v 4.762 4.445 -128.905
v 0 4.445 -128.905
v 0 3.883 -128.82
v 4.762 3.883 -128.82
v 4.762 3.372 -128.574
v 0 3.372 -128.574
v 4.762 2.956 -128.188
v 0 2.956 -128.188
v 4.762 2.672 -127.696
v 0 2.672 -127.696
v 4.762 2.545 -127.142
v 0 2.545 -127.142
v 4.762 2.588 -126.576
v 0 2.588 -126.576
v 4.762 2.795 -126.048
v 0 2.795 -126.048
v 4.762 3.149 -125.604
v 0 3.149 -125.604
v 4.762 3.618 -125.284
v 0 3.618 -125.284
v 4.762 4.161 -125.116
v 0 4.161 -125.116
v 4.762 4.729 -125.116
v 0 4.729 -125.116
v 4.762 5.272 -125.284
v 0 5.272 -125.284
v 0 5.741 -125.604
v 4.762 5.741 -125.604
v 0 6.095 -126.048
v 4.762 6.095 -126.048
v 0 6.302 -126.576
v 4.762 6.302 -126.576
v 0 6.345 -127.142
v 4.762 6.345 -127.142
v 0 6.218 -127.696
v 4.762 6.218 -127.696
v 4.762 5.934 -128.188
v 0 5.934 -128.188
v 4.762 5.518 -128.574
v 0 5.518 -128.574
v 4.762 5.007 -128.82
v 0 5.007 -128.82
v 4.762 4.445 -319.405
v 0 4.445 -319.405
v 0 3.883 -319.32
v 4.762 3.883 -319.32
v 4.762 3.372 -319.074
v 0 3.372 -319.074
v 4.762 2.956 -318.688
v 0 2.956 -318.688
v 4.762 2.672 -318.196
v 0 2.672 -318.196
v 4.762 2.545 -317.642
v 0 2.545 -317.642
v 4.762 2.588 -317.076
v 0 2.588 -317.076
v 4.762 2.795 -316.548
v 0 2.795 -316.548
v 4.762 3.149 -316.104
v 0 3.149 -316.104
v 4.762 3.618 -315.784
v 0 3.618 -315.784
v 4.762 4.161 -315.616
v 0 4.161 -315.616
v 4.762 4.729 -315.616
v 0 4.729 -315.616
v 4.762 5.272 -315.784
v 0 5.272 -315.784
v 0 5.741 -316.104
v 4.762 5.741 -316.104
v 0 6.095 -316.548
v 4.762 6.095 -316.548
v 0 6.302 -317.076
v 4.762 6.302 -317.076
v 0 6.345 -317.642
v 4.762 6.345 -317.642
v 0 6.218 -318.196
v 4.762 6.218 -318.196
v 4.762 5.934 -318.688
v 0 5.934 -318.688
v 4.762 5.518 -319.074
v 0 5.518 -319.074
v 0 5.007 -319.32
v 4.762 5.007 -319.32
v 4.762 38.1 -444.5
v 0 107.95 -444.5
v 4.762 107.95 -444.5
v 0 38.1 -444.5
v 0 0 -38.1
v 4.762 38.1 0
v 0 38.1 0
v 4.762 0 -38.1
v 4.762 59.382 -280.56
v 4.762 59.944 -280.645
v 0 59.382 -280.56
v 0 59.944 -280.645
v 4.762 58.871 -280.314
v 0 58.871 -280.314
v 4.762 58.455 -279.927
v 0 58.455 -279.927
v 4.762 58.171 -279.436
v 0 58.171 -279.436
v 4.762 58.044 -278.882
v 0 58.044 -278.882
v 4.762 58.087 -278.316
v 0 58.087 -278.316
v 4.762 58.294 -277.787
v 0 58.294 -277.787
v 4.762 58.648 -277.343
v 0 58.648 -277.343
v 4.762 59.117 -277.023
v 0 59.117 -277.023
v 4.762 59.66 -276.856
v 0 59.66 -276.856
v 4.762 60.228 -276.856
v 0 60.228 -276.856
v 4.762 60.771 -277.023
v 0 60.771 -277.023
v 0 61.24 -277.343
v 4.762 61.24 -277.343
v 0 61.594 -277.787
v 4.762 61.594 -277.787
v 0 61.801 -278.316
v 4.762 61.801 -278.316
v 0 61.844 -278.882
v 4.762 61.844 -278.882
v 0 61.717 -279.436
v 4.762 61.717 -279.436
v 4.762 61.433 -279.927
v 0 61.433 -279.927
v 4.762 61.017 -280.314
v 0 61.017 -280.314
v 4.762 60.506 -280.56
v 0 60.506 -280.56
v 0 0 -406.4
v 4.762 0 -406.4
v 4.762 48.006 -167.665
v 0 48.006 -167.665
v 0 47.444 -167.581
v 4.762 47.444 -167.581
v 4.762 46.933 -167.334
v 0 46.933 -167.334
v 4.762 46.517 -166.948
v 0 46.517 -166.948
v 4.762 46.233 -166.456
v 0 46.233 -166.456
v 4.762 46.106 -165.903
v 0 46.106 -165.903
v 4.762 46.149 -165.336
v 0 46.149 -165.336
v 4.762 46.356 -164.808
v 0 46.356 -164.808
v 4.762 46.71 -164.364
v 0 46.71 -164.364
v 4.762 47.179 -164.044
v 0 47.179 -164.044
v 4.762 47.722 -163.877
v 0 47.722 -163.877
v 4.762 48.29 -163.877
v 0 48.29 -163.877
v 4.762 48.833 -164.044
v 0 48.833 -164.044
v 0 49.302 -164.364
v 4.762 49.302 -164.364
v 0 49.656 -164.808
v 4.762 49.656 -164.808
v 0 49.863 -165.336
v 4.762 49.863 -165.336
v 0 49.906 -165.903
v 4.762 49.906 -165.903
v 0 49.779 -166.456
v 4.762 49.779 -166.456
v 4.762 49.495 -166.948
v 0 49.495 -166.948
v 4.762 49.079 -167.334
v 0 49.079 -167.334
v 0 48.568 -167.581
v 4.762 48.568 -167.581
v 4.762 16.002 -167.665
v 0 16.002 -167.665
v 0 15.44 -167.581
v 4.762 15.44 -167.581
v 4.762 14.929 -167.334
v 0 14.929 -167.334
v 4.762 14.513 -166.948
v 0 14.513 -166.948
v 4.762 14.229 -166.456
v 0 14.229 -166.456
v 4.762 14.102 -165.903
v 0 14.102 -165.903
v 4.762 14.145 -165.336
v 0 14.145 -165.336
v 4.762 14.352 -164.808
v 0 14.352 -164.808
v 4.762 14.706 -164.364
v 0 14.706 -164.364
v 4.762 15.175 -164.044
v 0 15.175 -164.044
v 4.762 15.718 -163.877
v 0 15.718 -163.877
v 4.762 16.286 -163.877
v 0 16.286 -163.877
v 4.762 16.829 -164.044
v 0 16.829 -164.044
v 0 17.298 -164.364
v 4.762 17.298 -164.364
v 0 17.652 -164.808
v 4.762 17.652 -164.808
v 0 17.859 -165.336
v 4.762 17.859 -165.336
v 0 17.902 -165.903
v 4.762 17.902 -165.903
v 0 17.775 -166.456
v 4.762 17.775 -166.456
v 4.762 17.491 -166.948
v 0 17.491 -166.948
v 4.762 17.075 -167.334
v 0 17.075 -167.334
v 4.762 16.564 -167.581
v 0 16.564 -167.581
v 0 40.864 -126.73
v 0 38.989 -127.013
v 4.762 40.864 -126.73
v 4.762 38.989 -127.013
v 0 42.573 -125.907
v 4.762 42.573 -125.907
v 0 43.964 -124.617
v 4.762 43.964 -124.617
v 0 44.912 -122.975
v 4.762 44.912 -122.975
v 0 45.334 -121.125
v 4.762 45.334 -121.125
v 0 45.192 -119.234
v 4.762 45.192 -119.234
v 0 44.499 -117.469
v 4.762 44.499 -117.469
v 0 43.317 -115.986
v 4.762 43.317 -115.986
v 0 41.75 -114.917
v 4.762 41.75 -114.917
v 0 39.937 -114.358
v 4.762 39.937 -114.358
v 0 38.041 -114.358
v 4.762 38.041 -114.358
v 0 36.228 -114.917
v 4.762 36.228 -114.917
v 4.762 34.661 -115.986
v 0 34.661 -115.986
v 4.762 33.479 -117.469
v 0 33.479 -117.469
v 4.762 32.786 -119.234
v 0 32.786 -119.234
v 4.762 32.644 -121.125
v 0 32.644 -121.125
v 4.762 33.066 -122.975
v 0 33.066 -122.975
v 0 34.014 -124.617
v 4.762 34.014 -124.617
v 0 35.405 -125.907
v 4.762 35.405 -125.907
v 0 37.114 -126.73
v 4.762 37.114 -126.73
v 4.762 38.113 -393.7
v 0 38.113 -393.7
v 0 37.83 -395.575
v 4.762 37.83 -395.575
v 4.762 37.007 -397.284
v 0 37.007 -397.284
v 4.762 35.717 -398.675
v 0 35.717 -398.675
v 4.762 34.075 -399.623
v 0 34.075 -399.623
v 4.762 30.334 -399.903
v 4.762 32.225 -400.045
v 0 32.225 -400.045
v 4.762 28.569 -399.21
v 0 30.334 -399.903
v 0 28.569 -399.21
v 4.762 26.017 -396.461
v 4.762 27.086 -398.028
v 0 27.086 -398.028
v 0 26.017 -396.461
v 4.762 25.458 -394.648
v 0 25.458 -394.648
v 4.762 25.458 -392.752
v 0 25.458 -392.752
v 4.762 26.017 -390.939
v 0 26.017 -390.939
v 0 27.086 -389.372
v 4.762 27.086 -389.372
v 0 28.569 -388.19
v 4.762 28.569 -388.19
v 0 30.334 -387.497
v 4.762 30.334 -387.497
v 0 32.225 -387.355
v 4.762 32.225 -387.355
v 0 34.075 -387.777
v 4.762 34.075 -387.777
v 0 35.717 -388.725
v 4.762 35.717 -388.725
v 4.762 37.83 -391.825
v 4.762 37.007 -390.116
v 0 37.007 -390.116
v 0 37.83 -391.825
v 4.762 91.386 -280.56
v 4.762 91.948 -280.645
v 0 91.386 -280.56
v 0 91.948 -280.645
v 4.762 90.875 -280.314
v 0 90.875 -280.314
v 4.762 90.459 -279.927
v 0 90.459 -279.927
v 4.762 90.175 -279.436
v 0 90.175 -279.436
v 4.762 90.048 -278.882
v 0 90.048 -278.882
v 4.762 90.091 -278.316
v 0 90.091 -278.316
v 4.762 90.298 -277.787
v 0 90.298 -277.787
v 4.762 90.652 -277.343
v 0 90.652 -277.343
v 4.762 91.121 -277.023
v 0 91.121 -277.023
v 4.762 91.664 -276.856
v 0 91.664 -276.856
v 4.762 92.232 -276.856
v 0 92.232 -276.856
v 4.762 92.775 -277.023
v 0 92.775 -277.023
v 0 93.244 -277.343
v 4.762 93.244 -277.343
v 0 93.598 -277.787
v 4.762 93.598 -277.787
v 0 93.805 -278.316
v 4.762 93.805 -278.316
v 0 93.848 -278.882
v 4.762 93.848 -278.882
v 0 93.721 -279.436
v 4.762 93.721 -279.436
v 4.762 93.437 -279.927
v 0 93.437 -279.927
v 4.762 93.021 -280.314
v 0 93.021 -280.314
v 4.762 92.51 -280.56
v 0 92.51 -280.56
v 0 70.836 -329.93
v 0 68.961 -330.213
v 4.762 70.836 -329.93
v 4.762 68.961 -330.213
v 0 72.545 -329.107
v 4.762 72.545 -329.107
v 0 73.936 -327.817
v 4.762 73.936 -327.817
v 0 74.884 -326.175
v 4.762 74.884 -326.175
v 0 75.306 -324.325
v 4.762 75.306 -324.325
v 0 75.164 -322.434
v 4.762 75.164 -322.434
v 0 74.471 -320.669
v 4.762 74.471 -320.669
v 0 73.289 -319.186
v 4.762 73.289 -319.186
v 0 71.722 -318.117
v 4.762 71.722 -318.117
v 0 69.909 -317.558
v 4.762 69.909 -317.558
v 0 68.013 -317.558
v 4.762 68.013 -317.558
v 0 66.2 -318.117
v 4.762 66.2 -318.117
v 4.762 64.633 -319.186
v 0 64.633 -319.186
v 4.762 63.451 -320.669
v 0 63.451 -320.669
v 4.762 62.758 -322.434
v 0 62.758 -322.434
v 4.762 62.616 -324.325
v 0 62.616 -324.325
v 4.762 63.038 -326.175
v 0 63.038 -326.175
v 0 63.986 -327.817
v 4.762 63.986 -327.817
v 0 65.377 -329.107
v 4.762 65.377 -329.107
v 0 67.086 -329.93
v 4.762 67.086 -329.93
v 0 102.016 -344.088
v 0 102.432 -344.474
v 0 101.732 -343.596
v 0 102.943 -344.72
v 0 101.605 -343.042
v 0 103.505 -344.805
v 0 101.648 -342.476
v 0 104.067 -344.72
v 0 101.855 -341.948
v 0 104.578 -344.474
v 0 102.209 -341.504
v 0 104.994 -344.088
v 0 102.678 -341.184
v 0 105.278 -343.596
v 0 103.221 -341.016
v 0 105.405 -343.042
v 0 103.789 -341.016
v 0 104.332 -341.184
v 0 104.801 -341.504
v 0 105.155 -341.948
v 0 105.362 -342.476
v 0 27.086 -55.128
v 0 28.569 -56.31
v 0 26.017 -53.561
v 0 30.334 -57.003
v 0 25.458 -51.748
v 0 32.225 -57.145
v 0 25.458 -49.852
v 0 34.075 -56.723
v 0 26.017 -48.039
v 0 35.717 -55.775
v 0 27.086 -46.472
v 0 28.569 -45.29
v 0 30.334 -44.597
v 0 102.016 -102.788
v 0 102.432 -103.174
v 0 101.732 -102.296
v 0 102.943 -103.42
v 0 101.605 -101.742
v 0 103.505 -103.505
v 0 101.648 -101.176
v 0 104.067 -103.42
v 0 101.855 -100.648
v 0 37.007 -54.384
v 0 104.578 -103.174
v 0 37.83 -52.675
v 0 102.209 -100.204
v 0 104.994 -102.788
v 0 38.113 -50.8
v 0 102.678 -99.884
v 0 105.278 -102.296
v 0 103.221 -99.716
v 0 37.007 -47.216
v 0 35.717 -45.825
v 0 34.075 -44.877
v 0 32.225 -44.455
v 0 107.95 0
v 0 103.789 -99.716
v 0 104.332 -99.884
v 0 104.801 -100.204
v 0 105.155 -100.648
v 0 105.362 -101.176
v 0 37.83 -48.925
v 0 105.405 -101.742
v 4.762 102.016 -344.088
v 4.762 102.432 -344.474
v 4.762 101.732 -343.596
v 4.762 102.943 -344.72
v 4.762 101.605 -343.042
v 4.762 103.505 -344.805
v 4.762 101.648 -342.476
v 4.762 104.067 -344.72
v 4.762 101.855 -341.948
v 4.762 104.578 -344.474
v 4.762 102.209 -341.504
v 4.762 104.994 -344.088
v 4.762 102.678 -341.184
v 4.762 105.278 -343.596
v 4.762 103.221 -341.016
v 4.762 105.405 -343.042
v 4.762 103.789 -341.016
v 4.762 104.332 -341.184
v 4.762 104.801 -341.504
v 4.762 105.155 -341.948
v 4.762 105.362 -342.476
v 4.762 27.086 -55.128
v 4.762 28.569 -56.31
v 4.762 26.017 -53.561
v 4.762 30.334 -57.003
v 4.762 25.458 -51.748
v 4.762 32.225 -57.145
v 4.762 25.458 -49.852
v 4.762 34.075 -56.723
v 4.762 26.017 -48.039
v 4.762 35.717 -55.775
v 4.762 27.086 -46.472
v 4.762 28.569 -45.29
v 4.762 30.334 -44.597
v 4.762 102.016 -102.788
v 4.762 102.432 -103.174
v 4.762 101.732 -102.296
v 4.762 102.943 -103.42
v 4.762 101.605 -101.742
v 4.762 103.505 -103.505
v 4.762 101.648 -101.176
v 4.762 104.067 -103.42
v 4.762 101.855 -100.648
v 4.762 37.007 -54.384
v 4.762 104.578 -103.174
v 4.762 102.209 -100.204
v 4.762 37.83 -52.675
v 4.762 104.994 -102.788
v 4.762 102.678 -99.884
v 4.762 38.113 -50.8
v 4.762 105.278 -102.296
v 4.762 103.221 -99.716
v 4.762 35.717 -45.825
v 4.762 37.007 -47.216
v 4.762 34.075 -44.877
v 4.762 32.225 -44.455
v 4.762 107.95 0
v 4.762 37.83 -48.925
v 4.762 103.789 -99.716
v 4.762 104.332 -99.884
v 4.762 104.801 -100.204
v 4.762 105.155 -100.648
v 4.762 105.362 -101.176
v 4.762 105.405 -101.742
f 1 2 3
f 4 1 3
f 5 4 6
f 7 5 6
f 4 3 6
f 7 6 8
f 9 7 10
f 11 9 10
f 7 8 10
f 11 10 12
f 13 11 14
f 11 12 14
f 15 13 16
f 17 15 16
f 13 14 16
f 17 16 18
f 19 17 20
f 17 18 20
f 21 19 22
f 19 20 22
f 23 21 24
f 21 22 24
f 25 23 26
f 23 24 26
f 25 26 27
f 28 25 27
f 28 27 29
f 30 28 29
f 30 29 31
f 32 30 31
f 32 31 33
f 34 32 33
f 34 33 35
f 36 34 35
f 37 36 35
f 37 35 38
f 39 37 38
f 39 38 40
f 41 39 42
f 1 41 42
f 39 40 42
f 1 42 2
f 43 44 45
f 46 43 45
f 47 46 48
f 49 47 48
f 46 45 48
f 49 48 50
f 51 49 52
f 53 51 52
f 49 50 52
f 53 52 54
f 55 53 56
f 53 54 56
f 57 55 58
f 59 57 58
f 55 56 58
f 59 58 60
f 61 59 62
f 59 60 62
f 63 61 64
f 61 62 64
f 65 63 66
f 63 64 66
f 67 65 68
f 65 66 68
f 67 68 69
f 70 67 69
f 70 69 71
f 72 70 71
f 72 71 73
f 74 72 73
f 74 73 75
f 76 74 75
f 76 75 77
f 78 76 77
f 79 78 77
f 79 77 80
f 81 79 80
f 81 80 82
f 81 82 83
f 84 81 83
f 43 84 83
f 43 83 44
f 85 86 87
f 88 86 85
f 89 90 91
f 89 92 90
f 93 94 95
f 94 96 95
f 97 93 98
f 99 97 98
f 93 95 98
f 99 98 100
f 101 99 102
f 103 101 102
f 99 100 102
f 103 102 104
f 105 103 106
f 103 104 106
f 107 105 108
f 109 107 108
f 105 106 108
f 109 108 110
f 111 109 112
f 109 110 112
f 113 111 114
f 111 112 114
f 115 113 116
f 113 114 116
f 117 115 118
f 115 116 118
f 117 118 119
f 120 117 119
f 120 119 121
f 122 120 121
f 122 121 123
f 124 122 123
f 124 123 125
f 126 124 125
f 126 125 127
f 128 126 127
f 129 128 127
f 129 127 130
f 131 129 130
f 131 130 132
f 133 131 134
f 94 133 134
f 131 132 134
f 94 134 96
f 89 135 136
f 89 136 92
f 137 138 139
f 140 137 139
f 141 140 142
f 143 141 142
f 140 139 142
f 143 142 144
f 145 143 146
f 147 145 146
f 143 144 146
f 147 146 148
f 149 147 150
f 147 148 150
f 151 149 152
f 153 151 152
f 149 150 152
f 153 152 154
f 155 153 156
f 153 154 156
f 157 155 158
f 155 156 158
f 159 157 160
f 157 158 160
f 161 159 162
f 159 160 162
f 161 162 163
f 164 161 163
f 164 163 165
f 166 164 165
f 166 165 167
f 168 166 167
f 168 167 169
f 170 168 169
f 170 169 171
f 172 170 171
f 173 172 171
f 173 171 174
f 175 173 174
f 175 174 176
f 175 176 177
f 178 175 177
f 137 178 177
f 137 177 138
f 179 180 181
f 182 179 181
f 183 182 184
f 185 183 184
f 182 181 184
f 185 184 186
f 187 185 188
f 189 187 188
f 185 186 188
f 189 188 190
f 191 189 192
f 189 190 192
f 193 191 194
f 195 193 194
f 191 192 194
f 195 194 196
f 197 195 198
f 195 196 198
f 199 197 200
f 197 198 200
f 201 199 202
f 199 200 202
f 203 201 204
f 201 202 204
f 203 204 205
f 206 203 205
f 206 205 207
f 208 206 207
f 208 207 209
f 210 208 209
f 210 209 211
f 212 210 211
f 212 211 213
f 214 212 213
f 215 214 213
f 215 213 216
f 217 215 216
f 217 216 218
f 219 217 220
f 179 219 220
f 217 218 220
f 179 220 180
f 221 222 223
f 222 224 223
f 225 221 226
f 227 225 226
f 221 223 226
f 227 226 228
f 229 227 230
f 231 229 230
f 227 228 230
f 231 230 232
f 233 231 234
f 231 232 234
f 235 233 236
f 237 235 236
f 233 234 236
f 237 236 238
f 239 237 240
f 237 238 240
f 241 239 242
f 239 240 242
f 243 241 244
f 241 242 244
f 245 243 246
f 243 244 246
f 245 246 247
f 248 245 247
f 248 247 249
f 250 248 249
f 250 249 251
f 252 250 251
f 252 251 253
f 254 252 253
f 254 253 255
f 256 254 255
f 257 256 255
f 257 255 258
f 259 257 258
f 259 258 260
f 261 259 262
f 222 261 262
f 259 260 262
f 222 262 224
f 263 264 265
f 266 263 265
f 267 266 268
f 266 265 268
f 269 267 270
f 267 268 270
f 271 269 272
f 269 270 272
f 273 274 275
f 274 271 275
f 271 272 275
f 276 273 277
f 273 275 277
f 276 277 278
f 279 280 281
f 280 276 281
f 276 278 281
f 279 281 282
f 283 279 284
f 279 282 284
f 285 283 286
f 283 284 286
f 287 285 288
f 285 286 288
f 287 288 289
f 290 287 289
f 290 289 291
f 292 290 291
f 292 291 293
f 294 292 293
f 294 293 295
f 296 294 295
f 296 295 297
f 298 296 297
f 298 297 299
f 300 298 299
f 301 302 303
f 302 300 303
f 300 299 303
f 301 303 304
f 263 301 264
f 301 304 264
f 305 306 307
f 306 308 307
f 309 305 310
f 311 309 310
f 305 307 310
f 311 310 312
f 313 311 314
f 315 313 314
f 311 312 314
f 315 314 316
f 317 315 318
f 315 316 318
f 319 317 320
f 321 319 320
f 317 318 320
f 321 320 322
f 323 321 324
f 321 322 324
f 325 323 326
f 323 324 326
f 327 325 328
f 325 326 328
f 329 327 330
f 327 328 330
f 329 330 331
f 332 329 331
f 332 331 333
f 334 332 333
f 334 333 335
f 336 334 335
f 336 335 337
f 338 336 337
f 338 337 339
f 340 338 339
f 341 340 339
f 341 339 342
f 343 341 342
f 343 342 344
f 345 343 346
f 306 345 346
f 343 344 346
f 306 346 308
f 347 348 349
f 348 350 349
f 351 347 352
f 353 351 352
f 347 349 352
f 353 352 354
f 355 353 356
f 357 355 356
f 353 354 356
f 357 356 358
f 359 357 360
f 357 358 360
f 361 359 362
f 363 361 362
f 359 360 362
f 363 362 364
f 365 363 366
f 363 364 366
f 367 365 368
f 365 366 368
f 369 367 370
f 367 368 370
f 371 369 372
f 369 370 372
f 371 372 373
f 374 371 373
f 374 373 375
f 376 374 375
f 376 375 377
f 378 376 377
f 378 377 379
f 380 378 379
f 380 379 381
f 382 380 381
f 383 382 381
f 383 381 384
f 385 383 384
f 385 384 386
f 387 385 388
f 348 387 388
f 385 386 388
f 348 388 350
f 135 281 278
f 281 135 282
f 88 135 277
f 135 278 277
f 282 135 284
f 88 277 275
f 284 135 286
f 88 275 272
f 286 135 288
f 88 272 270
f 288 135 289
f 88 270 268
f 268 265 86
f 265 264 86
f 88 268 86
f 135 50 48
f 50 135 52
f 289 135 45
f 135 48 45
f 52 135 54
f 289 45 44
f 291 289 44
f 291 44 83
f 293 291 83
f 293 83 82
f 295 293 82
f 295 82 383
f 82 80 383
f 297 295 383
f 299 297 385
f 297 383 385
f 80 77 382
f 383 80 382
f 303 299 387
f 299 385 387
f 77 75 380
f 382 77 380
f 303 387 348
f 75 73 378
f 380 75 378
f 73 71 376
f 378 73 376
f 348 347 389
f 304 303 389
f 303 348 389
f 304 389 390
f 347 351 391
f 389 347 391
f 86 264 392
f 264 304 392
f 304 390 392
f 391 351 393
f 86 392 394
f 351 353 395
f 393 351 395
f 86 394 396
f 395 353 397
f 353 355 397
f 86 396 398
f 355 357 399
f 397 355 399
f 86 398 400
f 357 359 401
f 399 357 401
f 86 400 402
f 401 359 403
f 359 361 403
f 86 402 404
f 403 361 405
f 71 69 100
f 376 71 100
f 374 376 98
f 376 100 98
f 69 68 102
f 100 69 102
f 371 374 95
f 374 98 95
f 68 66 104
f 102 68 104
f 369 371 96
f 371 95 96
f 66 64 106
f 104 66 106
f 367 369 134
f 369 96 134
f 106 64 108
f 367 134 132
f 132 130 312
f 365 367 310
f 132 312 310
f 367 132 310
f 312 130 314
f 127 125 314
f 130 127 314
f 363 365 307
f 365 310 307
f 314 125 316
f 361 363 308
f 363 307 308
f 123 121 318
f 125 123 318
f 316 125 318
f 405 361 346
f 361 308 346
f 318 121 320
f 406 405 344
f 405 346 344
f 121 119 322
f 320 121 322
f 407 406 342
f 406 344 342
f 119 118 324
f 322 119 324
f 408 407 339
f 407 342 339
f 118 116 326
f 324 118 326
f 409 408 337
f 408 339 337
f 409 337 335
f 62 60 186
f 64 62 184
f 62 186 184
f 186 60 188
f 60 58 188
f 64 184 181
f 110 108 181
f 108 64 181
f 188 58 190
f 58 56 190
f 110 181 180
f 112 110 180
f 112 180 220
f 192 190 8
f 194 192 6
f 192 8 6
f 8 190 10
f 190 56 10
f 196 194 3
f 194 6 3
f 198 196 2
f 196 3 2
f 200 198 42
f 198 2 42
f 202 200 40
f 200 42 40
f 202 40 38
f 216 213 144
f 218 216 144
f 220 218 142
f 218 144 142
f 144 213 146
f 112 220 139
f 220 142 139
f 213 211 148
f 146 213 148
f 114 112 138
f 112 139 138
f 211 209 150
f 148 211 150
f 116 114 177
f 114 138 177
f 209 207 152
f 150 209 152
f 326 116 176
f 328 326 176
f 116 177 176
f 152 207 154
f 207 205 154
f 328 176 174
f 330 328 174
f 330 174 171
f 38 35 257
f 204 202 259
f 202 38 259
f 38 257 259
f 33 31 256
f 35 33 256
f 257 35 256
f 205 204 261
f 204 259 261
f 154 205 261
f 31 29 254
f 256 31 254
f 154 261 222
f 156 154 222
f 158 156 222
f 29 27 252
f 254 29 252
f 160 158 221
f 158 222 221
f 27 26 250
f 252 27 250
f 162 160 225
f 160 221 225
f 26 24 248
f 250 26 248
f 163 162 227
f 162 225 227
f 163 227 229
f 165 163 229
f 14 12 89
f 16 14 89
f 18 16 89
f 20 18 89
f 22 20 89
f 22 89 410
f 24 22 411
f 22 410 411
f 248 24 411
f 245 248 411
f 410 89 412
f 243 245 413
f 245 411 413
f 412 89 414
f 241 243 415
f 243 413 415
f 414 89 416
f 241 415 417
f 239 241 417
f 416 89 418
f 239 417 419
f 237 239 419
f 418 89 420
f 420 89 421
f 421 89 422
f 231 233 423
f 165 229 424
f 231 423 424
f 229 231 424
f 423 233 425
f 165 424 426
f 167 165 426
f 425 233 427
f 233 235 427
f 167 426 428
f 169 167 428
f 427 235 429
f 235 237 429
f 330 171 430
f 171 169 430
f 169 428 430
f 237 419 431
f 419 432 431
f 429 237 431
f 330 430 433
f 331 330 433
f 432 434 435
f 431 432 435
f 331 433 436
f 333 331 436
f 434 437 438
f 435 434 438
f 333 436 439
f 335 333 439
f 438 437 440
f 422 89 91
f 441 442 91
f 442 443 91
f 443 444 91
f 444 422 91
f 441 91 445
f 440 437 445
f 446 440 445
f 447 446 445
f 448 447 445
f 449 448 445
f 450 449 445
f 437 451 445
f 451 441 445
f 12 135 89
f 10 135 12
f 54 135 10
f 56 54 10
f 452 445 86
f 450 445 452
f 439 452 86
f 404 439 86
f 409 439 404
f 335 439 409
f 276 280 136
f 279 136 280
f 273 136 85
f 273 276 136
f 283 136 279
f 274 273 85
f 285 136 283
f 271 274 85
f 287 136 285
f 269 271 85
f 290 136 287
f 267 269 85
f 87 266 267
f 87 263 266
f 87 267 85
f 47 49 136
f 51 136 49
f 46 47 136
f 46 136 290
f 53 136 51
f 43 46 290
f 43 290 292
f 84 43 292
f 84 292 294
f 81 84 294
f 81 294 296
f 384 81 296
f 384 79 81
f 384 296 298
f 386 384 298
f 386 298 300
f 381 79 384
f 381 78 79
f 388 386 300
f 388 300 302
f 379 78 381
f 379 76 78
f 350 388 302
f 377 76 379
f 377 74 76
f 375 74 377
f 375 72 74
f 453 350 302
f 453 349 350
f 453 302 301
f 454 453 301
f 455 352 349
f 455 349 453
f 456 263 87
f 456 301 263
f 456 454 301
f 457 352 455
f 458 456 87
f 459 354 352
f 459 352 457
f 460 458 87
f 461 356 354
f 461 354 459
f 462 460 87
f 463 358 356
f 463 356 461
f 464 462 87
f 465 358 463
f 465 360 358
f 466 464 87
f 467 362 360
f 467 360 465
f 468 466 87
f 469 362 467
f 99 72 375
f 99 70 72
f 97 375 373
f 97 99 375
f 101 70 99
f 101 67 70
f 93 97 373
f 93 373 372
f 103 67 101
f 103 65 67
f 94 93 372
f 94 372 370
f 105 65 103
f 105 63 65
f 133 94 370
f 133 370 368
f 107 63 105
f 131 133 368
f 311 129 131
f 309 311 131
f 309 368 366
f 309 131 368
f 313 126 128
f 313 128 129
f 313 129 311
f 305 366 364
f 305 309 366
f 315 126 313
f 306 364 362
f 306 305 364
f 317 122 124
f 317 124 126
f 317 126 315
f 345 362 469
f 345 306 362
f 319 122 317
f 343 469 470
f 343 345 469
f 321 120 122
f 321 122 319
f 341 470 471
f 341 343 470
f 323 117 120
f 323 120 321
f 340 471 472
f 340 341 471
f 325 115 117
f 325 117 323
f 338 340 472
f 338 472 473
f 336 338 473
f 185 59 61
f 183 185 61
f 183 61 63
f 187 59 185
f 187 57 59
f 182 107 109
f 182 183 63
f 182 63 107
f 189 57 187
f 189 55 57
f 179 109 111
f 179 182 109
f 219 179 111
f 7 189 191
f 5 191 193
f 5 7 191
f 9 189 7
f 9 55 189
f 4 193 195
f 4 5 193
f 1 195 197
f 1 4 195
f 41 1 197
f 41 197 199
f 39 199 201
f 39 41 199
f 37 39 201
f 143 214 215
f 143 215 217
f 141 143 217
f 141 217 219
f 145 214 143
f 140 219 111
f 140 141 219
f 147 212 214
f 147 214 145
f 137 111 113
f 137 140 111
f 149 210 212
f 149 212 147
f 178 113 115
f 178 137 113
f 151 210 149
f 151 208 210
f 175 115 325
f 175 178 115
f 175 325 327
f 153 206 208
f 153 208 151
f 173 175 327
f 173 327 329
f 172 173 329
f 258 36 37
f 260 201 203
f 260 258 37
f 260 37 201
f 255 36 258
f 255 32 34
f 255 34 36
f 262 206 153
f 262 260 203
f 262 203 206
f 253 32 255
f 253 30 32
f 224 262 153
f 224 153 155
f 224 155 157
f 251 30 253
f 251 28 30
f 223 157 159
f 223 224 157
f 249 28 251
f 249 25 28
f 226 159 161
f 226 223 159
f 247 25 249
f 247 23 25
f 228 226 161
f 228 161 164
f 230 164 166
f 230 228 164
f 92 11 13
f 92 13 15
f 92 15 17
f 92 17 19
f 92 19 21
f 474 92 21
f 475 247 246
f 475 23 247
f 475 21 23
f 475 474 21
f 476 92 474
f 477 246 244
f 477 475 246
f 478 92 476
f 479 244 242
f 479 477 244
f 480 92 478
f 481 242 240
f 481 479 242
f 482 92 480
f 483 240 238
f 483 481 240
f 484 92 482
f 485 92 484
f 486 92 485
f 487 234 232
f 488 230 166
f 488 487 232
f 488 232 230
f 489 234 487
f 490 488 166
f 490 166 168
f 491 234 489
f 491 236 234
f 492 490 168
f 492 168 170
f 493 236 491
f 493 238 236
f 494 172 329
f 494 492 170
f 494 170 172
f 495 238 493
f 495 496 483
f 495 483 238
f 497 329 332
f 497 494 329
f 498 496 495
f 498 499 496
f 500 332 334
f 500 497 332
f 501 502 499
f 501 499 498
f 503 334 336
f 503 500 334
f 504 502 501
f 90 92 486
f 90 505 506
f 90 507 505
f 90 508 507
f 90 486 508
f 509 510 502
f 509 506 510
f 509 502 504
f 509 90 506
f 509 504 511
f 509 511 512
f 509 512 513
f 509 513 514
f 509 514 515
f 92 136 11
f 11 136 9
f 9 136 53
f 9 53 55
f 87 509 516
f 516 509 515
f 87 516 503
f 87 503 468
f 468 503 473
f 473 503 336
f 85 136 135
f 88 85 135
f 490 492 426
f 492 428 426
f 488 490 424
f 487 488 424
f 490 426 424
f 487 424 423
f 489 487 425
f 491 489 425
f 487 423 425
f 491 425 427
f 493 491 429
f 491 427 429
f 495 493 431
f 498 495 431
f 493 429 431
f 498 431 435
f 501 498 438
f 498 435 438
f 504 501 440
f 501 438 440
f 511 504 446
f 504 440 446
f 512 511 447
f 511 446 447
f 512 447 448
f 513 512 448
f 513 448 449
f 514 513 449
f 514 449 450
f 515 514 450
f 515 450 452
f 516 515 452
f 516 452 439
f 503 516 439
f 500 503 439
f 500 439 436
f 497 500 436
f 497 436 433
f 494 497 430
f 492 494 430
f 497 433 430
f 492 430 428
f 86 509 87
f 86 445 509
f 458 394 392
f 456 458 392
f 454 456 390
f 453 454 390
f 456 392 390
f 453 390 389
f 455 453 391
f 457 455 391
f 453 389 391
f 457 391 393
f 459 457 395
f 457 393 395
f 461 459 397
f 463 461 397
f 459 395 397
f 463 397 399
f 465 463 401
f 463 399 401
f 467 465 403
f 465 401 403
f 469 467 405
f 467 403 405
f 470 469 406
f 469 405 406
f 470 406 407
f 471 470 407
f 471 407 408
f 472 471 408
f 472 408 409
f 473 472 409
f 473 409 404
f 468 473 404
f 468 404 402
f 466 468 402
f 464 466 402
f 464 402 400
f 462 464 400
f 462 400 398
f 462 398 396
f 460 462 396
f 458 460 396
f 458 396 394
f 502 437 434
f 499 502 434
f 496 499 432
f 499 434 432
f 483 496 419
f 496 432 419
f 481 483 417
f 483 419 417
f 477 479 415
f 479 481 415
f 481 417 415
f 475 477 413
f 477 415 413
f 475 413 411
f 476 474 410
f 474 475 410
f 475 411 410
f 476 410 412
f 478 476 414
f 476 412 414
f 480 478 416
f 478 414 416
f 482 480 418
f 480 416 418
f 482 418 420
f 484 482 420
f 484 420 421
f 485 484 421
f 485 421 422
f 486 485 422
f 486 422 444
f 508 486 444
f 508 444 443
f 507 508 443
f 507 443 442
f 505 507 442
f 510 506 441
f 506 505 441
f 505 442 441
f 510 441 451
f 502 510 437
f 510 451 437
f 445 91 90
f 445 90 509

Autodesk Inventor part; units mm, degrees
ref_plane "YZ Plane" through (0, 0, 0) normal (1, 0, 0) x (0, 1, 0)
ref_plane "XZ Plane" through (0, 0, 0) normal (0, 1, 0) x (-1, 0, 0)
ref_plane "XY Plane" through (0, 0, 0) normal (0, 0, 1) x (1, 0, 0)
sketch "Sketch1" plane through (0, 0, 0) normal (1, 0, 0) x (0, 1, 0)
  line L0 (0, 0) -> (107.95, 0)
  line L1 (107.95, 0) -> (107.95, -444.5)
  line L2 (107.95, -444.5) -> (0, -444.5)
  line L3 (0, -444.5) -> (0, 0)
  circle A0 centre (31.75, -50.8) radius 6.3627
  circle A1 centre (31.75, -393.7) radius 6.3627
  circle A2 centre (92.6338, -165.5318) radius 1.5875
  circle A3 centre (76.6318, -165.5318) radius 1.5875
  circle A4 centre (15.3162, -278.9682) radius 1.5875
  circle A5 centre (31.3182, -278.9682) radius 1.5875
  dimension "d0" = 107.95
  dimension "d1" = 444.5
  dimension "d2" = 12.7254
  dimension "d3" = 31.75
  dimension "d4" = 50.8
  dimension "d5" = 50.8
  dimension "d22" = 165.5318
  dimension "d23" = 3.175
  dimension "d24" = 15.3162
  dimension "d25" = 3.175
  dimension "d26" = 16.002
  dimension "d27" = 165.5318
  dimension "d28" = 3.175
  dimension "d29" = 15.3162
  dimension "d30" = 165.5318
  dimension "d31" = 3.175
  dimension "d32" = 16.002
  dimension "d33" = 165.5318
extrude "Extrusion1" add sketch "Sketch1" along normal blind 4.7625 contours L0 L1 L2 L3 | A2 | A3 | A4 | A5
chamfer "Chamfer1" distance 38.1 angle 45 1 edges at (2.3813, 0, 0)
chamfer "Chamfer2" distance 38.1 angle 45 1 edges at (2.3813, 0, -444.5)
sketch "Sketch2" plane through (4.7625, 0, 0) normal (1, 0, 0) x (0, 0, -1)
  line L0 (444.5, 38.1) -> (406.4, 0) projected
  line L1 (444.5, 38.1) -> (444.5, 107.95) projected
  line L2 (444.5, 107.95) -> (0, 107.95) projected
  line L3 (0, 107.95) -> (0, 38.1) projected
  line L4 (38.1, 0) -> (0, 38.1) projected
  line L5 (38.1, 0) -> (406.4, 0) projected
  circle A0 centre (393.7, 31.75) radius 6.3627 projected
  circle A1 centre (50.8, 31.75) radius 6.3627 projected
  circle A2 centre (120.65, 38.989) radius 6.3627
  circle A3 centre (323.85, 68.961) radius 6.3627
  point P0 (0, 0)
  dimension "d14" = 12.7254
  dimension "d15" = 120.65
  dimension "d17" = 12.7254
  dimension "d19" = 120.65
  dimension "d78" = 38.989
  dimension "d79" = 38.989
extrude "Extrusion2" cut sketch "Sketch2" against normal blind 25.4 contours A2 | A3
sketch "Sketch6" plane through (4.7625, 0, 0) normal (1, 0, 0) x (0, 0, -1)
  circle A0 centre (120.65, 38.989) radius 6.3627 projected
  circle A1 centre (323.85, 68.961) radius 6.3627 projected
  line L0 (444.5, 38.1) -> (406.4, 0) projected
  line L1 (444.5, 38.1) -> (444.5, 107.95) projected
  line L2 (444.5, 107.95) -> (0, 107.95) projected
  line L3 (0, 107.95) -> (0, 38.1) projected
  line L4 (38.1, 0) -> (0, 38.1) projected
  line L5 (38.1, 0) -> (406.4, 0) projected
  circle A2 centre (393.7, 31.75) radius 6.3627 projected
  circle A3 centre (50.8, 31.75) radius 6.3627 projected
  point P0 (0, 0)
  point P1 (165.7604, 48.006)
  point P2 (165.7604, 16.002)
  point P3 (278.7396, 91.948)
  point P4 (278.7396, 59.944)
  dimension "d80" = 32.004
  dimension "d81" = 45.1104
  dimension "d82" = 45.1104
  dimension "d83" = 16.002
  dimension "d84" = 45.1104
  dimension "d85" = 45.1104
  dimension "d86" = 32.004
  dimension "d87" = 16.002
hole "Hole1" at (4.7625, 48.006, -165.7604) at (4.7625, 16.002, -165.7604) at (4.7625, 91.948, -278.7396) at (4.7625, 59.944, -278.7396) direction (-1, 0, 0) diameter 3.81 end through all
sketch "Sketch7" plane through (4.7625, 0, 0) normal (1, 0, 0) x (0, 0, -1)
  circle A0 centre (278.7396, 91.948) radius 1.905 projected
  circle A1 centre (165.7604, 48.006) radius 1.905 projected
  circle A2 centre (165.7604, 16.002) radius 1.905 projected
  circle A3 centre (278.7396, 59.944) radius 1.905 projected
  circle A4 centre (120.65, 38.989) radius 6.3627 projected
  circle A5 centre (323.85, 68.961) radius 6.3627 projected
  line L0 (444.5, 38.1) -> (406.4, 0) projected
  line L1 (444.5, 38.1) -> (444.5, 107.95) projected
  line L2 (444.5, 107.95) -> (0, 107.95) projected
  line L3 (0, 107.95) -> (0, 38.1) projected
  line L4 (38.1, 0) -> (0, 38.1) projected
  line L5 (38.1, 0) -> (406.4, 0) projected
  circle A6 centre (393.7, 31.75) radius 6.3627 projected
  circle A7 centre (50.8, 31.75) radius 6.3627 projected
  point P0 (0, 0)
  point P1 (101.6, 103.505)
  point P2 (342.9, 103.505)
  point P3 (127, 4.445)
  point P4 (317.5, 4.445)
  dimension "d95" = 4.445
  dimension "d96" = 4.445
  dimension "d97" = 4.445
  dimension "d98" = 4.445
  dimension "d99" = 101.6
  dimension "d100" = 101.6
  dimension "d101" = 127
  dimension "d102" = 127
hole "Hole2" at (4.7625, 103.505, -101.6) at (4.7625, 103.505, -342.9) at (4.7625, 4.445, -127) at (4.7625, 4.445, -317.5) direction (-1, 0, 0) diameter 3.81 depth 25.4 tip angle 118
equation "\"d19\" = d15"
equation "\"d82\" = d81"
equation "\"d96\" = d95"
equation "\"d97\" = d95"
equation "\"d98\" = d95"
equation "\"d100\" = d99"
properties part number "DriveTrain3.0"
